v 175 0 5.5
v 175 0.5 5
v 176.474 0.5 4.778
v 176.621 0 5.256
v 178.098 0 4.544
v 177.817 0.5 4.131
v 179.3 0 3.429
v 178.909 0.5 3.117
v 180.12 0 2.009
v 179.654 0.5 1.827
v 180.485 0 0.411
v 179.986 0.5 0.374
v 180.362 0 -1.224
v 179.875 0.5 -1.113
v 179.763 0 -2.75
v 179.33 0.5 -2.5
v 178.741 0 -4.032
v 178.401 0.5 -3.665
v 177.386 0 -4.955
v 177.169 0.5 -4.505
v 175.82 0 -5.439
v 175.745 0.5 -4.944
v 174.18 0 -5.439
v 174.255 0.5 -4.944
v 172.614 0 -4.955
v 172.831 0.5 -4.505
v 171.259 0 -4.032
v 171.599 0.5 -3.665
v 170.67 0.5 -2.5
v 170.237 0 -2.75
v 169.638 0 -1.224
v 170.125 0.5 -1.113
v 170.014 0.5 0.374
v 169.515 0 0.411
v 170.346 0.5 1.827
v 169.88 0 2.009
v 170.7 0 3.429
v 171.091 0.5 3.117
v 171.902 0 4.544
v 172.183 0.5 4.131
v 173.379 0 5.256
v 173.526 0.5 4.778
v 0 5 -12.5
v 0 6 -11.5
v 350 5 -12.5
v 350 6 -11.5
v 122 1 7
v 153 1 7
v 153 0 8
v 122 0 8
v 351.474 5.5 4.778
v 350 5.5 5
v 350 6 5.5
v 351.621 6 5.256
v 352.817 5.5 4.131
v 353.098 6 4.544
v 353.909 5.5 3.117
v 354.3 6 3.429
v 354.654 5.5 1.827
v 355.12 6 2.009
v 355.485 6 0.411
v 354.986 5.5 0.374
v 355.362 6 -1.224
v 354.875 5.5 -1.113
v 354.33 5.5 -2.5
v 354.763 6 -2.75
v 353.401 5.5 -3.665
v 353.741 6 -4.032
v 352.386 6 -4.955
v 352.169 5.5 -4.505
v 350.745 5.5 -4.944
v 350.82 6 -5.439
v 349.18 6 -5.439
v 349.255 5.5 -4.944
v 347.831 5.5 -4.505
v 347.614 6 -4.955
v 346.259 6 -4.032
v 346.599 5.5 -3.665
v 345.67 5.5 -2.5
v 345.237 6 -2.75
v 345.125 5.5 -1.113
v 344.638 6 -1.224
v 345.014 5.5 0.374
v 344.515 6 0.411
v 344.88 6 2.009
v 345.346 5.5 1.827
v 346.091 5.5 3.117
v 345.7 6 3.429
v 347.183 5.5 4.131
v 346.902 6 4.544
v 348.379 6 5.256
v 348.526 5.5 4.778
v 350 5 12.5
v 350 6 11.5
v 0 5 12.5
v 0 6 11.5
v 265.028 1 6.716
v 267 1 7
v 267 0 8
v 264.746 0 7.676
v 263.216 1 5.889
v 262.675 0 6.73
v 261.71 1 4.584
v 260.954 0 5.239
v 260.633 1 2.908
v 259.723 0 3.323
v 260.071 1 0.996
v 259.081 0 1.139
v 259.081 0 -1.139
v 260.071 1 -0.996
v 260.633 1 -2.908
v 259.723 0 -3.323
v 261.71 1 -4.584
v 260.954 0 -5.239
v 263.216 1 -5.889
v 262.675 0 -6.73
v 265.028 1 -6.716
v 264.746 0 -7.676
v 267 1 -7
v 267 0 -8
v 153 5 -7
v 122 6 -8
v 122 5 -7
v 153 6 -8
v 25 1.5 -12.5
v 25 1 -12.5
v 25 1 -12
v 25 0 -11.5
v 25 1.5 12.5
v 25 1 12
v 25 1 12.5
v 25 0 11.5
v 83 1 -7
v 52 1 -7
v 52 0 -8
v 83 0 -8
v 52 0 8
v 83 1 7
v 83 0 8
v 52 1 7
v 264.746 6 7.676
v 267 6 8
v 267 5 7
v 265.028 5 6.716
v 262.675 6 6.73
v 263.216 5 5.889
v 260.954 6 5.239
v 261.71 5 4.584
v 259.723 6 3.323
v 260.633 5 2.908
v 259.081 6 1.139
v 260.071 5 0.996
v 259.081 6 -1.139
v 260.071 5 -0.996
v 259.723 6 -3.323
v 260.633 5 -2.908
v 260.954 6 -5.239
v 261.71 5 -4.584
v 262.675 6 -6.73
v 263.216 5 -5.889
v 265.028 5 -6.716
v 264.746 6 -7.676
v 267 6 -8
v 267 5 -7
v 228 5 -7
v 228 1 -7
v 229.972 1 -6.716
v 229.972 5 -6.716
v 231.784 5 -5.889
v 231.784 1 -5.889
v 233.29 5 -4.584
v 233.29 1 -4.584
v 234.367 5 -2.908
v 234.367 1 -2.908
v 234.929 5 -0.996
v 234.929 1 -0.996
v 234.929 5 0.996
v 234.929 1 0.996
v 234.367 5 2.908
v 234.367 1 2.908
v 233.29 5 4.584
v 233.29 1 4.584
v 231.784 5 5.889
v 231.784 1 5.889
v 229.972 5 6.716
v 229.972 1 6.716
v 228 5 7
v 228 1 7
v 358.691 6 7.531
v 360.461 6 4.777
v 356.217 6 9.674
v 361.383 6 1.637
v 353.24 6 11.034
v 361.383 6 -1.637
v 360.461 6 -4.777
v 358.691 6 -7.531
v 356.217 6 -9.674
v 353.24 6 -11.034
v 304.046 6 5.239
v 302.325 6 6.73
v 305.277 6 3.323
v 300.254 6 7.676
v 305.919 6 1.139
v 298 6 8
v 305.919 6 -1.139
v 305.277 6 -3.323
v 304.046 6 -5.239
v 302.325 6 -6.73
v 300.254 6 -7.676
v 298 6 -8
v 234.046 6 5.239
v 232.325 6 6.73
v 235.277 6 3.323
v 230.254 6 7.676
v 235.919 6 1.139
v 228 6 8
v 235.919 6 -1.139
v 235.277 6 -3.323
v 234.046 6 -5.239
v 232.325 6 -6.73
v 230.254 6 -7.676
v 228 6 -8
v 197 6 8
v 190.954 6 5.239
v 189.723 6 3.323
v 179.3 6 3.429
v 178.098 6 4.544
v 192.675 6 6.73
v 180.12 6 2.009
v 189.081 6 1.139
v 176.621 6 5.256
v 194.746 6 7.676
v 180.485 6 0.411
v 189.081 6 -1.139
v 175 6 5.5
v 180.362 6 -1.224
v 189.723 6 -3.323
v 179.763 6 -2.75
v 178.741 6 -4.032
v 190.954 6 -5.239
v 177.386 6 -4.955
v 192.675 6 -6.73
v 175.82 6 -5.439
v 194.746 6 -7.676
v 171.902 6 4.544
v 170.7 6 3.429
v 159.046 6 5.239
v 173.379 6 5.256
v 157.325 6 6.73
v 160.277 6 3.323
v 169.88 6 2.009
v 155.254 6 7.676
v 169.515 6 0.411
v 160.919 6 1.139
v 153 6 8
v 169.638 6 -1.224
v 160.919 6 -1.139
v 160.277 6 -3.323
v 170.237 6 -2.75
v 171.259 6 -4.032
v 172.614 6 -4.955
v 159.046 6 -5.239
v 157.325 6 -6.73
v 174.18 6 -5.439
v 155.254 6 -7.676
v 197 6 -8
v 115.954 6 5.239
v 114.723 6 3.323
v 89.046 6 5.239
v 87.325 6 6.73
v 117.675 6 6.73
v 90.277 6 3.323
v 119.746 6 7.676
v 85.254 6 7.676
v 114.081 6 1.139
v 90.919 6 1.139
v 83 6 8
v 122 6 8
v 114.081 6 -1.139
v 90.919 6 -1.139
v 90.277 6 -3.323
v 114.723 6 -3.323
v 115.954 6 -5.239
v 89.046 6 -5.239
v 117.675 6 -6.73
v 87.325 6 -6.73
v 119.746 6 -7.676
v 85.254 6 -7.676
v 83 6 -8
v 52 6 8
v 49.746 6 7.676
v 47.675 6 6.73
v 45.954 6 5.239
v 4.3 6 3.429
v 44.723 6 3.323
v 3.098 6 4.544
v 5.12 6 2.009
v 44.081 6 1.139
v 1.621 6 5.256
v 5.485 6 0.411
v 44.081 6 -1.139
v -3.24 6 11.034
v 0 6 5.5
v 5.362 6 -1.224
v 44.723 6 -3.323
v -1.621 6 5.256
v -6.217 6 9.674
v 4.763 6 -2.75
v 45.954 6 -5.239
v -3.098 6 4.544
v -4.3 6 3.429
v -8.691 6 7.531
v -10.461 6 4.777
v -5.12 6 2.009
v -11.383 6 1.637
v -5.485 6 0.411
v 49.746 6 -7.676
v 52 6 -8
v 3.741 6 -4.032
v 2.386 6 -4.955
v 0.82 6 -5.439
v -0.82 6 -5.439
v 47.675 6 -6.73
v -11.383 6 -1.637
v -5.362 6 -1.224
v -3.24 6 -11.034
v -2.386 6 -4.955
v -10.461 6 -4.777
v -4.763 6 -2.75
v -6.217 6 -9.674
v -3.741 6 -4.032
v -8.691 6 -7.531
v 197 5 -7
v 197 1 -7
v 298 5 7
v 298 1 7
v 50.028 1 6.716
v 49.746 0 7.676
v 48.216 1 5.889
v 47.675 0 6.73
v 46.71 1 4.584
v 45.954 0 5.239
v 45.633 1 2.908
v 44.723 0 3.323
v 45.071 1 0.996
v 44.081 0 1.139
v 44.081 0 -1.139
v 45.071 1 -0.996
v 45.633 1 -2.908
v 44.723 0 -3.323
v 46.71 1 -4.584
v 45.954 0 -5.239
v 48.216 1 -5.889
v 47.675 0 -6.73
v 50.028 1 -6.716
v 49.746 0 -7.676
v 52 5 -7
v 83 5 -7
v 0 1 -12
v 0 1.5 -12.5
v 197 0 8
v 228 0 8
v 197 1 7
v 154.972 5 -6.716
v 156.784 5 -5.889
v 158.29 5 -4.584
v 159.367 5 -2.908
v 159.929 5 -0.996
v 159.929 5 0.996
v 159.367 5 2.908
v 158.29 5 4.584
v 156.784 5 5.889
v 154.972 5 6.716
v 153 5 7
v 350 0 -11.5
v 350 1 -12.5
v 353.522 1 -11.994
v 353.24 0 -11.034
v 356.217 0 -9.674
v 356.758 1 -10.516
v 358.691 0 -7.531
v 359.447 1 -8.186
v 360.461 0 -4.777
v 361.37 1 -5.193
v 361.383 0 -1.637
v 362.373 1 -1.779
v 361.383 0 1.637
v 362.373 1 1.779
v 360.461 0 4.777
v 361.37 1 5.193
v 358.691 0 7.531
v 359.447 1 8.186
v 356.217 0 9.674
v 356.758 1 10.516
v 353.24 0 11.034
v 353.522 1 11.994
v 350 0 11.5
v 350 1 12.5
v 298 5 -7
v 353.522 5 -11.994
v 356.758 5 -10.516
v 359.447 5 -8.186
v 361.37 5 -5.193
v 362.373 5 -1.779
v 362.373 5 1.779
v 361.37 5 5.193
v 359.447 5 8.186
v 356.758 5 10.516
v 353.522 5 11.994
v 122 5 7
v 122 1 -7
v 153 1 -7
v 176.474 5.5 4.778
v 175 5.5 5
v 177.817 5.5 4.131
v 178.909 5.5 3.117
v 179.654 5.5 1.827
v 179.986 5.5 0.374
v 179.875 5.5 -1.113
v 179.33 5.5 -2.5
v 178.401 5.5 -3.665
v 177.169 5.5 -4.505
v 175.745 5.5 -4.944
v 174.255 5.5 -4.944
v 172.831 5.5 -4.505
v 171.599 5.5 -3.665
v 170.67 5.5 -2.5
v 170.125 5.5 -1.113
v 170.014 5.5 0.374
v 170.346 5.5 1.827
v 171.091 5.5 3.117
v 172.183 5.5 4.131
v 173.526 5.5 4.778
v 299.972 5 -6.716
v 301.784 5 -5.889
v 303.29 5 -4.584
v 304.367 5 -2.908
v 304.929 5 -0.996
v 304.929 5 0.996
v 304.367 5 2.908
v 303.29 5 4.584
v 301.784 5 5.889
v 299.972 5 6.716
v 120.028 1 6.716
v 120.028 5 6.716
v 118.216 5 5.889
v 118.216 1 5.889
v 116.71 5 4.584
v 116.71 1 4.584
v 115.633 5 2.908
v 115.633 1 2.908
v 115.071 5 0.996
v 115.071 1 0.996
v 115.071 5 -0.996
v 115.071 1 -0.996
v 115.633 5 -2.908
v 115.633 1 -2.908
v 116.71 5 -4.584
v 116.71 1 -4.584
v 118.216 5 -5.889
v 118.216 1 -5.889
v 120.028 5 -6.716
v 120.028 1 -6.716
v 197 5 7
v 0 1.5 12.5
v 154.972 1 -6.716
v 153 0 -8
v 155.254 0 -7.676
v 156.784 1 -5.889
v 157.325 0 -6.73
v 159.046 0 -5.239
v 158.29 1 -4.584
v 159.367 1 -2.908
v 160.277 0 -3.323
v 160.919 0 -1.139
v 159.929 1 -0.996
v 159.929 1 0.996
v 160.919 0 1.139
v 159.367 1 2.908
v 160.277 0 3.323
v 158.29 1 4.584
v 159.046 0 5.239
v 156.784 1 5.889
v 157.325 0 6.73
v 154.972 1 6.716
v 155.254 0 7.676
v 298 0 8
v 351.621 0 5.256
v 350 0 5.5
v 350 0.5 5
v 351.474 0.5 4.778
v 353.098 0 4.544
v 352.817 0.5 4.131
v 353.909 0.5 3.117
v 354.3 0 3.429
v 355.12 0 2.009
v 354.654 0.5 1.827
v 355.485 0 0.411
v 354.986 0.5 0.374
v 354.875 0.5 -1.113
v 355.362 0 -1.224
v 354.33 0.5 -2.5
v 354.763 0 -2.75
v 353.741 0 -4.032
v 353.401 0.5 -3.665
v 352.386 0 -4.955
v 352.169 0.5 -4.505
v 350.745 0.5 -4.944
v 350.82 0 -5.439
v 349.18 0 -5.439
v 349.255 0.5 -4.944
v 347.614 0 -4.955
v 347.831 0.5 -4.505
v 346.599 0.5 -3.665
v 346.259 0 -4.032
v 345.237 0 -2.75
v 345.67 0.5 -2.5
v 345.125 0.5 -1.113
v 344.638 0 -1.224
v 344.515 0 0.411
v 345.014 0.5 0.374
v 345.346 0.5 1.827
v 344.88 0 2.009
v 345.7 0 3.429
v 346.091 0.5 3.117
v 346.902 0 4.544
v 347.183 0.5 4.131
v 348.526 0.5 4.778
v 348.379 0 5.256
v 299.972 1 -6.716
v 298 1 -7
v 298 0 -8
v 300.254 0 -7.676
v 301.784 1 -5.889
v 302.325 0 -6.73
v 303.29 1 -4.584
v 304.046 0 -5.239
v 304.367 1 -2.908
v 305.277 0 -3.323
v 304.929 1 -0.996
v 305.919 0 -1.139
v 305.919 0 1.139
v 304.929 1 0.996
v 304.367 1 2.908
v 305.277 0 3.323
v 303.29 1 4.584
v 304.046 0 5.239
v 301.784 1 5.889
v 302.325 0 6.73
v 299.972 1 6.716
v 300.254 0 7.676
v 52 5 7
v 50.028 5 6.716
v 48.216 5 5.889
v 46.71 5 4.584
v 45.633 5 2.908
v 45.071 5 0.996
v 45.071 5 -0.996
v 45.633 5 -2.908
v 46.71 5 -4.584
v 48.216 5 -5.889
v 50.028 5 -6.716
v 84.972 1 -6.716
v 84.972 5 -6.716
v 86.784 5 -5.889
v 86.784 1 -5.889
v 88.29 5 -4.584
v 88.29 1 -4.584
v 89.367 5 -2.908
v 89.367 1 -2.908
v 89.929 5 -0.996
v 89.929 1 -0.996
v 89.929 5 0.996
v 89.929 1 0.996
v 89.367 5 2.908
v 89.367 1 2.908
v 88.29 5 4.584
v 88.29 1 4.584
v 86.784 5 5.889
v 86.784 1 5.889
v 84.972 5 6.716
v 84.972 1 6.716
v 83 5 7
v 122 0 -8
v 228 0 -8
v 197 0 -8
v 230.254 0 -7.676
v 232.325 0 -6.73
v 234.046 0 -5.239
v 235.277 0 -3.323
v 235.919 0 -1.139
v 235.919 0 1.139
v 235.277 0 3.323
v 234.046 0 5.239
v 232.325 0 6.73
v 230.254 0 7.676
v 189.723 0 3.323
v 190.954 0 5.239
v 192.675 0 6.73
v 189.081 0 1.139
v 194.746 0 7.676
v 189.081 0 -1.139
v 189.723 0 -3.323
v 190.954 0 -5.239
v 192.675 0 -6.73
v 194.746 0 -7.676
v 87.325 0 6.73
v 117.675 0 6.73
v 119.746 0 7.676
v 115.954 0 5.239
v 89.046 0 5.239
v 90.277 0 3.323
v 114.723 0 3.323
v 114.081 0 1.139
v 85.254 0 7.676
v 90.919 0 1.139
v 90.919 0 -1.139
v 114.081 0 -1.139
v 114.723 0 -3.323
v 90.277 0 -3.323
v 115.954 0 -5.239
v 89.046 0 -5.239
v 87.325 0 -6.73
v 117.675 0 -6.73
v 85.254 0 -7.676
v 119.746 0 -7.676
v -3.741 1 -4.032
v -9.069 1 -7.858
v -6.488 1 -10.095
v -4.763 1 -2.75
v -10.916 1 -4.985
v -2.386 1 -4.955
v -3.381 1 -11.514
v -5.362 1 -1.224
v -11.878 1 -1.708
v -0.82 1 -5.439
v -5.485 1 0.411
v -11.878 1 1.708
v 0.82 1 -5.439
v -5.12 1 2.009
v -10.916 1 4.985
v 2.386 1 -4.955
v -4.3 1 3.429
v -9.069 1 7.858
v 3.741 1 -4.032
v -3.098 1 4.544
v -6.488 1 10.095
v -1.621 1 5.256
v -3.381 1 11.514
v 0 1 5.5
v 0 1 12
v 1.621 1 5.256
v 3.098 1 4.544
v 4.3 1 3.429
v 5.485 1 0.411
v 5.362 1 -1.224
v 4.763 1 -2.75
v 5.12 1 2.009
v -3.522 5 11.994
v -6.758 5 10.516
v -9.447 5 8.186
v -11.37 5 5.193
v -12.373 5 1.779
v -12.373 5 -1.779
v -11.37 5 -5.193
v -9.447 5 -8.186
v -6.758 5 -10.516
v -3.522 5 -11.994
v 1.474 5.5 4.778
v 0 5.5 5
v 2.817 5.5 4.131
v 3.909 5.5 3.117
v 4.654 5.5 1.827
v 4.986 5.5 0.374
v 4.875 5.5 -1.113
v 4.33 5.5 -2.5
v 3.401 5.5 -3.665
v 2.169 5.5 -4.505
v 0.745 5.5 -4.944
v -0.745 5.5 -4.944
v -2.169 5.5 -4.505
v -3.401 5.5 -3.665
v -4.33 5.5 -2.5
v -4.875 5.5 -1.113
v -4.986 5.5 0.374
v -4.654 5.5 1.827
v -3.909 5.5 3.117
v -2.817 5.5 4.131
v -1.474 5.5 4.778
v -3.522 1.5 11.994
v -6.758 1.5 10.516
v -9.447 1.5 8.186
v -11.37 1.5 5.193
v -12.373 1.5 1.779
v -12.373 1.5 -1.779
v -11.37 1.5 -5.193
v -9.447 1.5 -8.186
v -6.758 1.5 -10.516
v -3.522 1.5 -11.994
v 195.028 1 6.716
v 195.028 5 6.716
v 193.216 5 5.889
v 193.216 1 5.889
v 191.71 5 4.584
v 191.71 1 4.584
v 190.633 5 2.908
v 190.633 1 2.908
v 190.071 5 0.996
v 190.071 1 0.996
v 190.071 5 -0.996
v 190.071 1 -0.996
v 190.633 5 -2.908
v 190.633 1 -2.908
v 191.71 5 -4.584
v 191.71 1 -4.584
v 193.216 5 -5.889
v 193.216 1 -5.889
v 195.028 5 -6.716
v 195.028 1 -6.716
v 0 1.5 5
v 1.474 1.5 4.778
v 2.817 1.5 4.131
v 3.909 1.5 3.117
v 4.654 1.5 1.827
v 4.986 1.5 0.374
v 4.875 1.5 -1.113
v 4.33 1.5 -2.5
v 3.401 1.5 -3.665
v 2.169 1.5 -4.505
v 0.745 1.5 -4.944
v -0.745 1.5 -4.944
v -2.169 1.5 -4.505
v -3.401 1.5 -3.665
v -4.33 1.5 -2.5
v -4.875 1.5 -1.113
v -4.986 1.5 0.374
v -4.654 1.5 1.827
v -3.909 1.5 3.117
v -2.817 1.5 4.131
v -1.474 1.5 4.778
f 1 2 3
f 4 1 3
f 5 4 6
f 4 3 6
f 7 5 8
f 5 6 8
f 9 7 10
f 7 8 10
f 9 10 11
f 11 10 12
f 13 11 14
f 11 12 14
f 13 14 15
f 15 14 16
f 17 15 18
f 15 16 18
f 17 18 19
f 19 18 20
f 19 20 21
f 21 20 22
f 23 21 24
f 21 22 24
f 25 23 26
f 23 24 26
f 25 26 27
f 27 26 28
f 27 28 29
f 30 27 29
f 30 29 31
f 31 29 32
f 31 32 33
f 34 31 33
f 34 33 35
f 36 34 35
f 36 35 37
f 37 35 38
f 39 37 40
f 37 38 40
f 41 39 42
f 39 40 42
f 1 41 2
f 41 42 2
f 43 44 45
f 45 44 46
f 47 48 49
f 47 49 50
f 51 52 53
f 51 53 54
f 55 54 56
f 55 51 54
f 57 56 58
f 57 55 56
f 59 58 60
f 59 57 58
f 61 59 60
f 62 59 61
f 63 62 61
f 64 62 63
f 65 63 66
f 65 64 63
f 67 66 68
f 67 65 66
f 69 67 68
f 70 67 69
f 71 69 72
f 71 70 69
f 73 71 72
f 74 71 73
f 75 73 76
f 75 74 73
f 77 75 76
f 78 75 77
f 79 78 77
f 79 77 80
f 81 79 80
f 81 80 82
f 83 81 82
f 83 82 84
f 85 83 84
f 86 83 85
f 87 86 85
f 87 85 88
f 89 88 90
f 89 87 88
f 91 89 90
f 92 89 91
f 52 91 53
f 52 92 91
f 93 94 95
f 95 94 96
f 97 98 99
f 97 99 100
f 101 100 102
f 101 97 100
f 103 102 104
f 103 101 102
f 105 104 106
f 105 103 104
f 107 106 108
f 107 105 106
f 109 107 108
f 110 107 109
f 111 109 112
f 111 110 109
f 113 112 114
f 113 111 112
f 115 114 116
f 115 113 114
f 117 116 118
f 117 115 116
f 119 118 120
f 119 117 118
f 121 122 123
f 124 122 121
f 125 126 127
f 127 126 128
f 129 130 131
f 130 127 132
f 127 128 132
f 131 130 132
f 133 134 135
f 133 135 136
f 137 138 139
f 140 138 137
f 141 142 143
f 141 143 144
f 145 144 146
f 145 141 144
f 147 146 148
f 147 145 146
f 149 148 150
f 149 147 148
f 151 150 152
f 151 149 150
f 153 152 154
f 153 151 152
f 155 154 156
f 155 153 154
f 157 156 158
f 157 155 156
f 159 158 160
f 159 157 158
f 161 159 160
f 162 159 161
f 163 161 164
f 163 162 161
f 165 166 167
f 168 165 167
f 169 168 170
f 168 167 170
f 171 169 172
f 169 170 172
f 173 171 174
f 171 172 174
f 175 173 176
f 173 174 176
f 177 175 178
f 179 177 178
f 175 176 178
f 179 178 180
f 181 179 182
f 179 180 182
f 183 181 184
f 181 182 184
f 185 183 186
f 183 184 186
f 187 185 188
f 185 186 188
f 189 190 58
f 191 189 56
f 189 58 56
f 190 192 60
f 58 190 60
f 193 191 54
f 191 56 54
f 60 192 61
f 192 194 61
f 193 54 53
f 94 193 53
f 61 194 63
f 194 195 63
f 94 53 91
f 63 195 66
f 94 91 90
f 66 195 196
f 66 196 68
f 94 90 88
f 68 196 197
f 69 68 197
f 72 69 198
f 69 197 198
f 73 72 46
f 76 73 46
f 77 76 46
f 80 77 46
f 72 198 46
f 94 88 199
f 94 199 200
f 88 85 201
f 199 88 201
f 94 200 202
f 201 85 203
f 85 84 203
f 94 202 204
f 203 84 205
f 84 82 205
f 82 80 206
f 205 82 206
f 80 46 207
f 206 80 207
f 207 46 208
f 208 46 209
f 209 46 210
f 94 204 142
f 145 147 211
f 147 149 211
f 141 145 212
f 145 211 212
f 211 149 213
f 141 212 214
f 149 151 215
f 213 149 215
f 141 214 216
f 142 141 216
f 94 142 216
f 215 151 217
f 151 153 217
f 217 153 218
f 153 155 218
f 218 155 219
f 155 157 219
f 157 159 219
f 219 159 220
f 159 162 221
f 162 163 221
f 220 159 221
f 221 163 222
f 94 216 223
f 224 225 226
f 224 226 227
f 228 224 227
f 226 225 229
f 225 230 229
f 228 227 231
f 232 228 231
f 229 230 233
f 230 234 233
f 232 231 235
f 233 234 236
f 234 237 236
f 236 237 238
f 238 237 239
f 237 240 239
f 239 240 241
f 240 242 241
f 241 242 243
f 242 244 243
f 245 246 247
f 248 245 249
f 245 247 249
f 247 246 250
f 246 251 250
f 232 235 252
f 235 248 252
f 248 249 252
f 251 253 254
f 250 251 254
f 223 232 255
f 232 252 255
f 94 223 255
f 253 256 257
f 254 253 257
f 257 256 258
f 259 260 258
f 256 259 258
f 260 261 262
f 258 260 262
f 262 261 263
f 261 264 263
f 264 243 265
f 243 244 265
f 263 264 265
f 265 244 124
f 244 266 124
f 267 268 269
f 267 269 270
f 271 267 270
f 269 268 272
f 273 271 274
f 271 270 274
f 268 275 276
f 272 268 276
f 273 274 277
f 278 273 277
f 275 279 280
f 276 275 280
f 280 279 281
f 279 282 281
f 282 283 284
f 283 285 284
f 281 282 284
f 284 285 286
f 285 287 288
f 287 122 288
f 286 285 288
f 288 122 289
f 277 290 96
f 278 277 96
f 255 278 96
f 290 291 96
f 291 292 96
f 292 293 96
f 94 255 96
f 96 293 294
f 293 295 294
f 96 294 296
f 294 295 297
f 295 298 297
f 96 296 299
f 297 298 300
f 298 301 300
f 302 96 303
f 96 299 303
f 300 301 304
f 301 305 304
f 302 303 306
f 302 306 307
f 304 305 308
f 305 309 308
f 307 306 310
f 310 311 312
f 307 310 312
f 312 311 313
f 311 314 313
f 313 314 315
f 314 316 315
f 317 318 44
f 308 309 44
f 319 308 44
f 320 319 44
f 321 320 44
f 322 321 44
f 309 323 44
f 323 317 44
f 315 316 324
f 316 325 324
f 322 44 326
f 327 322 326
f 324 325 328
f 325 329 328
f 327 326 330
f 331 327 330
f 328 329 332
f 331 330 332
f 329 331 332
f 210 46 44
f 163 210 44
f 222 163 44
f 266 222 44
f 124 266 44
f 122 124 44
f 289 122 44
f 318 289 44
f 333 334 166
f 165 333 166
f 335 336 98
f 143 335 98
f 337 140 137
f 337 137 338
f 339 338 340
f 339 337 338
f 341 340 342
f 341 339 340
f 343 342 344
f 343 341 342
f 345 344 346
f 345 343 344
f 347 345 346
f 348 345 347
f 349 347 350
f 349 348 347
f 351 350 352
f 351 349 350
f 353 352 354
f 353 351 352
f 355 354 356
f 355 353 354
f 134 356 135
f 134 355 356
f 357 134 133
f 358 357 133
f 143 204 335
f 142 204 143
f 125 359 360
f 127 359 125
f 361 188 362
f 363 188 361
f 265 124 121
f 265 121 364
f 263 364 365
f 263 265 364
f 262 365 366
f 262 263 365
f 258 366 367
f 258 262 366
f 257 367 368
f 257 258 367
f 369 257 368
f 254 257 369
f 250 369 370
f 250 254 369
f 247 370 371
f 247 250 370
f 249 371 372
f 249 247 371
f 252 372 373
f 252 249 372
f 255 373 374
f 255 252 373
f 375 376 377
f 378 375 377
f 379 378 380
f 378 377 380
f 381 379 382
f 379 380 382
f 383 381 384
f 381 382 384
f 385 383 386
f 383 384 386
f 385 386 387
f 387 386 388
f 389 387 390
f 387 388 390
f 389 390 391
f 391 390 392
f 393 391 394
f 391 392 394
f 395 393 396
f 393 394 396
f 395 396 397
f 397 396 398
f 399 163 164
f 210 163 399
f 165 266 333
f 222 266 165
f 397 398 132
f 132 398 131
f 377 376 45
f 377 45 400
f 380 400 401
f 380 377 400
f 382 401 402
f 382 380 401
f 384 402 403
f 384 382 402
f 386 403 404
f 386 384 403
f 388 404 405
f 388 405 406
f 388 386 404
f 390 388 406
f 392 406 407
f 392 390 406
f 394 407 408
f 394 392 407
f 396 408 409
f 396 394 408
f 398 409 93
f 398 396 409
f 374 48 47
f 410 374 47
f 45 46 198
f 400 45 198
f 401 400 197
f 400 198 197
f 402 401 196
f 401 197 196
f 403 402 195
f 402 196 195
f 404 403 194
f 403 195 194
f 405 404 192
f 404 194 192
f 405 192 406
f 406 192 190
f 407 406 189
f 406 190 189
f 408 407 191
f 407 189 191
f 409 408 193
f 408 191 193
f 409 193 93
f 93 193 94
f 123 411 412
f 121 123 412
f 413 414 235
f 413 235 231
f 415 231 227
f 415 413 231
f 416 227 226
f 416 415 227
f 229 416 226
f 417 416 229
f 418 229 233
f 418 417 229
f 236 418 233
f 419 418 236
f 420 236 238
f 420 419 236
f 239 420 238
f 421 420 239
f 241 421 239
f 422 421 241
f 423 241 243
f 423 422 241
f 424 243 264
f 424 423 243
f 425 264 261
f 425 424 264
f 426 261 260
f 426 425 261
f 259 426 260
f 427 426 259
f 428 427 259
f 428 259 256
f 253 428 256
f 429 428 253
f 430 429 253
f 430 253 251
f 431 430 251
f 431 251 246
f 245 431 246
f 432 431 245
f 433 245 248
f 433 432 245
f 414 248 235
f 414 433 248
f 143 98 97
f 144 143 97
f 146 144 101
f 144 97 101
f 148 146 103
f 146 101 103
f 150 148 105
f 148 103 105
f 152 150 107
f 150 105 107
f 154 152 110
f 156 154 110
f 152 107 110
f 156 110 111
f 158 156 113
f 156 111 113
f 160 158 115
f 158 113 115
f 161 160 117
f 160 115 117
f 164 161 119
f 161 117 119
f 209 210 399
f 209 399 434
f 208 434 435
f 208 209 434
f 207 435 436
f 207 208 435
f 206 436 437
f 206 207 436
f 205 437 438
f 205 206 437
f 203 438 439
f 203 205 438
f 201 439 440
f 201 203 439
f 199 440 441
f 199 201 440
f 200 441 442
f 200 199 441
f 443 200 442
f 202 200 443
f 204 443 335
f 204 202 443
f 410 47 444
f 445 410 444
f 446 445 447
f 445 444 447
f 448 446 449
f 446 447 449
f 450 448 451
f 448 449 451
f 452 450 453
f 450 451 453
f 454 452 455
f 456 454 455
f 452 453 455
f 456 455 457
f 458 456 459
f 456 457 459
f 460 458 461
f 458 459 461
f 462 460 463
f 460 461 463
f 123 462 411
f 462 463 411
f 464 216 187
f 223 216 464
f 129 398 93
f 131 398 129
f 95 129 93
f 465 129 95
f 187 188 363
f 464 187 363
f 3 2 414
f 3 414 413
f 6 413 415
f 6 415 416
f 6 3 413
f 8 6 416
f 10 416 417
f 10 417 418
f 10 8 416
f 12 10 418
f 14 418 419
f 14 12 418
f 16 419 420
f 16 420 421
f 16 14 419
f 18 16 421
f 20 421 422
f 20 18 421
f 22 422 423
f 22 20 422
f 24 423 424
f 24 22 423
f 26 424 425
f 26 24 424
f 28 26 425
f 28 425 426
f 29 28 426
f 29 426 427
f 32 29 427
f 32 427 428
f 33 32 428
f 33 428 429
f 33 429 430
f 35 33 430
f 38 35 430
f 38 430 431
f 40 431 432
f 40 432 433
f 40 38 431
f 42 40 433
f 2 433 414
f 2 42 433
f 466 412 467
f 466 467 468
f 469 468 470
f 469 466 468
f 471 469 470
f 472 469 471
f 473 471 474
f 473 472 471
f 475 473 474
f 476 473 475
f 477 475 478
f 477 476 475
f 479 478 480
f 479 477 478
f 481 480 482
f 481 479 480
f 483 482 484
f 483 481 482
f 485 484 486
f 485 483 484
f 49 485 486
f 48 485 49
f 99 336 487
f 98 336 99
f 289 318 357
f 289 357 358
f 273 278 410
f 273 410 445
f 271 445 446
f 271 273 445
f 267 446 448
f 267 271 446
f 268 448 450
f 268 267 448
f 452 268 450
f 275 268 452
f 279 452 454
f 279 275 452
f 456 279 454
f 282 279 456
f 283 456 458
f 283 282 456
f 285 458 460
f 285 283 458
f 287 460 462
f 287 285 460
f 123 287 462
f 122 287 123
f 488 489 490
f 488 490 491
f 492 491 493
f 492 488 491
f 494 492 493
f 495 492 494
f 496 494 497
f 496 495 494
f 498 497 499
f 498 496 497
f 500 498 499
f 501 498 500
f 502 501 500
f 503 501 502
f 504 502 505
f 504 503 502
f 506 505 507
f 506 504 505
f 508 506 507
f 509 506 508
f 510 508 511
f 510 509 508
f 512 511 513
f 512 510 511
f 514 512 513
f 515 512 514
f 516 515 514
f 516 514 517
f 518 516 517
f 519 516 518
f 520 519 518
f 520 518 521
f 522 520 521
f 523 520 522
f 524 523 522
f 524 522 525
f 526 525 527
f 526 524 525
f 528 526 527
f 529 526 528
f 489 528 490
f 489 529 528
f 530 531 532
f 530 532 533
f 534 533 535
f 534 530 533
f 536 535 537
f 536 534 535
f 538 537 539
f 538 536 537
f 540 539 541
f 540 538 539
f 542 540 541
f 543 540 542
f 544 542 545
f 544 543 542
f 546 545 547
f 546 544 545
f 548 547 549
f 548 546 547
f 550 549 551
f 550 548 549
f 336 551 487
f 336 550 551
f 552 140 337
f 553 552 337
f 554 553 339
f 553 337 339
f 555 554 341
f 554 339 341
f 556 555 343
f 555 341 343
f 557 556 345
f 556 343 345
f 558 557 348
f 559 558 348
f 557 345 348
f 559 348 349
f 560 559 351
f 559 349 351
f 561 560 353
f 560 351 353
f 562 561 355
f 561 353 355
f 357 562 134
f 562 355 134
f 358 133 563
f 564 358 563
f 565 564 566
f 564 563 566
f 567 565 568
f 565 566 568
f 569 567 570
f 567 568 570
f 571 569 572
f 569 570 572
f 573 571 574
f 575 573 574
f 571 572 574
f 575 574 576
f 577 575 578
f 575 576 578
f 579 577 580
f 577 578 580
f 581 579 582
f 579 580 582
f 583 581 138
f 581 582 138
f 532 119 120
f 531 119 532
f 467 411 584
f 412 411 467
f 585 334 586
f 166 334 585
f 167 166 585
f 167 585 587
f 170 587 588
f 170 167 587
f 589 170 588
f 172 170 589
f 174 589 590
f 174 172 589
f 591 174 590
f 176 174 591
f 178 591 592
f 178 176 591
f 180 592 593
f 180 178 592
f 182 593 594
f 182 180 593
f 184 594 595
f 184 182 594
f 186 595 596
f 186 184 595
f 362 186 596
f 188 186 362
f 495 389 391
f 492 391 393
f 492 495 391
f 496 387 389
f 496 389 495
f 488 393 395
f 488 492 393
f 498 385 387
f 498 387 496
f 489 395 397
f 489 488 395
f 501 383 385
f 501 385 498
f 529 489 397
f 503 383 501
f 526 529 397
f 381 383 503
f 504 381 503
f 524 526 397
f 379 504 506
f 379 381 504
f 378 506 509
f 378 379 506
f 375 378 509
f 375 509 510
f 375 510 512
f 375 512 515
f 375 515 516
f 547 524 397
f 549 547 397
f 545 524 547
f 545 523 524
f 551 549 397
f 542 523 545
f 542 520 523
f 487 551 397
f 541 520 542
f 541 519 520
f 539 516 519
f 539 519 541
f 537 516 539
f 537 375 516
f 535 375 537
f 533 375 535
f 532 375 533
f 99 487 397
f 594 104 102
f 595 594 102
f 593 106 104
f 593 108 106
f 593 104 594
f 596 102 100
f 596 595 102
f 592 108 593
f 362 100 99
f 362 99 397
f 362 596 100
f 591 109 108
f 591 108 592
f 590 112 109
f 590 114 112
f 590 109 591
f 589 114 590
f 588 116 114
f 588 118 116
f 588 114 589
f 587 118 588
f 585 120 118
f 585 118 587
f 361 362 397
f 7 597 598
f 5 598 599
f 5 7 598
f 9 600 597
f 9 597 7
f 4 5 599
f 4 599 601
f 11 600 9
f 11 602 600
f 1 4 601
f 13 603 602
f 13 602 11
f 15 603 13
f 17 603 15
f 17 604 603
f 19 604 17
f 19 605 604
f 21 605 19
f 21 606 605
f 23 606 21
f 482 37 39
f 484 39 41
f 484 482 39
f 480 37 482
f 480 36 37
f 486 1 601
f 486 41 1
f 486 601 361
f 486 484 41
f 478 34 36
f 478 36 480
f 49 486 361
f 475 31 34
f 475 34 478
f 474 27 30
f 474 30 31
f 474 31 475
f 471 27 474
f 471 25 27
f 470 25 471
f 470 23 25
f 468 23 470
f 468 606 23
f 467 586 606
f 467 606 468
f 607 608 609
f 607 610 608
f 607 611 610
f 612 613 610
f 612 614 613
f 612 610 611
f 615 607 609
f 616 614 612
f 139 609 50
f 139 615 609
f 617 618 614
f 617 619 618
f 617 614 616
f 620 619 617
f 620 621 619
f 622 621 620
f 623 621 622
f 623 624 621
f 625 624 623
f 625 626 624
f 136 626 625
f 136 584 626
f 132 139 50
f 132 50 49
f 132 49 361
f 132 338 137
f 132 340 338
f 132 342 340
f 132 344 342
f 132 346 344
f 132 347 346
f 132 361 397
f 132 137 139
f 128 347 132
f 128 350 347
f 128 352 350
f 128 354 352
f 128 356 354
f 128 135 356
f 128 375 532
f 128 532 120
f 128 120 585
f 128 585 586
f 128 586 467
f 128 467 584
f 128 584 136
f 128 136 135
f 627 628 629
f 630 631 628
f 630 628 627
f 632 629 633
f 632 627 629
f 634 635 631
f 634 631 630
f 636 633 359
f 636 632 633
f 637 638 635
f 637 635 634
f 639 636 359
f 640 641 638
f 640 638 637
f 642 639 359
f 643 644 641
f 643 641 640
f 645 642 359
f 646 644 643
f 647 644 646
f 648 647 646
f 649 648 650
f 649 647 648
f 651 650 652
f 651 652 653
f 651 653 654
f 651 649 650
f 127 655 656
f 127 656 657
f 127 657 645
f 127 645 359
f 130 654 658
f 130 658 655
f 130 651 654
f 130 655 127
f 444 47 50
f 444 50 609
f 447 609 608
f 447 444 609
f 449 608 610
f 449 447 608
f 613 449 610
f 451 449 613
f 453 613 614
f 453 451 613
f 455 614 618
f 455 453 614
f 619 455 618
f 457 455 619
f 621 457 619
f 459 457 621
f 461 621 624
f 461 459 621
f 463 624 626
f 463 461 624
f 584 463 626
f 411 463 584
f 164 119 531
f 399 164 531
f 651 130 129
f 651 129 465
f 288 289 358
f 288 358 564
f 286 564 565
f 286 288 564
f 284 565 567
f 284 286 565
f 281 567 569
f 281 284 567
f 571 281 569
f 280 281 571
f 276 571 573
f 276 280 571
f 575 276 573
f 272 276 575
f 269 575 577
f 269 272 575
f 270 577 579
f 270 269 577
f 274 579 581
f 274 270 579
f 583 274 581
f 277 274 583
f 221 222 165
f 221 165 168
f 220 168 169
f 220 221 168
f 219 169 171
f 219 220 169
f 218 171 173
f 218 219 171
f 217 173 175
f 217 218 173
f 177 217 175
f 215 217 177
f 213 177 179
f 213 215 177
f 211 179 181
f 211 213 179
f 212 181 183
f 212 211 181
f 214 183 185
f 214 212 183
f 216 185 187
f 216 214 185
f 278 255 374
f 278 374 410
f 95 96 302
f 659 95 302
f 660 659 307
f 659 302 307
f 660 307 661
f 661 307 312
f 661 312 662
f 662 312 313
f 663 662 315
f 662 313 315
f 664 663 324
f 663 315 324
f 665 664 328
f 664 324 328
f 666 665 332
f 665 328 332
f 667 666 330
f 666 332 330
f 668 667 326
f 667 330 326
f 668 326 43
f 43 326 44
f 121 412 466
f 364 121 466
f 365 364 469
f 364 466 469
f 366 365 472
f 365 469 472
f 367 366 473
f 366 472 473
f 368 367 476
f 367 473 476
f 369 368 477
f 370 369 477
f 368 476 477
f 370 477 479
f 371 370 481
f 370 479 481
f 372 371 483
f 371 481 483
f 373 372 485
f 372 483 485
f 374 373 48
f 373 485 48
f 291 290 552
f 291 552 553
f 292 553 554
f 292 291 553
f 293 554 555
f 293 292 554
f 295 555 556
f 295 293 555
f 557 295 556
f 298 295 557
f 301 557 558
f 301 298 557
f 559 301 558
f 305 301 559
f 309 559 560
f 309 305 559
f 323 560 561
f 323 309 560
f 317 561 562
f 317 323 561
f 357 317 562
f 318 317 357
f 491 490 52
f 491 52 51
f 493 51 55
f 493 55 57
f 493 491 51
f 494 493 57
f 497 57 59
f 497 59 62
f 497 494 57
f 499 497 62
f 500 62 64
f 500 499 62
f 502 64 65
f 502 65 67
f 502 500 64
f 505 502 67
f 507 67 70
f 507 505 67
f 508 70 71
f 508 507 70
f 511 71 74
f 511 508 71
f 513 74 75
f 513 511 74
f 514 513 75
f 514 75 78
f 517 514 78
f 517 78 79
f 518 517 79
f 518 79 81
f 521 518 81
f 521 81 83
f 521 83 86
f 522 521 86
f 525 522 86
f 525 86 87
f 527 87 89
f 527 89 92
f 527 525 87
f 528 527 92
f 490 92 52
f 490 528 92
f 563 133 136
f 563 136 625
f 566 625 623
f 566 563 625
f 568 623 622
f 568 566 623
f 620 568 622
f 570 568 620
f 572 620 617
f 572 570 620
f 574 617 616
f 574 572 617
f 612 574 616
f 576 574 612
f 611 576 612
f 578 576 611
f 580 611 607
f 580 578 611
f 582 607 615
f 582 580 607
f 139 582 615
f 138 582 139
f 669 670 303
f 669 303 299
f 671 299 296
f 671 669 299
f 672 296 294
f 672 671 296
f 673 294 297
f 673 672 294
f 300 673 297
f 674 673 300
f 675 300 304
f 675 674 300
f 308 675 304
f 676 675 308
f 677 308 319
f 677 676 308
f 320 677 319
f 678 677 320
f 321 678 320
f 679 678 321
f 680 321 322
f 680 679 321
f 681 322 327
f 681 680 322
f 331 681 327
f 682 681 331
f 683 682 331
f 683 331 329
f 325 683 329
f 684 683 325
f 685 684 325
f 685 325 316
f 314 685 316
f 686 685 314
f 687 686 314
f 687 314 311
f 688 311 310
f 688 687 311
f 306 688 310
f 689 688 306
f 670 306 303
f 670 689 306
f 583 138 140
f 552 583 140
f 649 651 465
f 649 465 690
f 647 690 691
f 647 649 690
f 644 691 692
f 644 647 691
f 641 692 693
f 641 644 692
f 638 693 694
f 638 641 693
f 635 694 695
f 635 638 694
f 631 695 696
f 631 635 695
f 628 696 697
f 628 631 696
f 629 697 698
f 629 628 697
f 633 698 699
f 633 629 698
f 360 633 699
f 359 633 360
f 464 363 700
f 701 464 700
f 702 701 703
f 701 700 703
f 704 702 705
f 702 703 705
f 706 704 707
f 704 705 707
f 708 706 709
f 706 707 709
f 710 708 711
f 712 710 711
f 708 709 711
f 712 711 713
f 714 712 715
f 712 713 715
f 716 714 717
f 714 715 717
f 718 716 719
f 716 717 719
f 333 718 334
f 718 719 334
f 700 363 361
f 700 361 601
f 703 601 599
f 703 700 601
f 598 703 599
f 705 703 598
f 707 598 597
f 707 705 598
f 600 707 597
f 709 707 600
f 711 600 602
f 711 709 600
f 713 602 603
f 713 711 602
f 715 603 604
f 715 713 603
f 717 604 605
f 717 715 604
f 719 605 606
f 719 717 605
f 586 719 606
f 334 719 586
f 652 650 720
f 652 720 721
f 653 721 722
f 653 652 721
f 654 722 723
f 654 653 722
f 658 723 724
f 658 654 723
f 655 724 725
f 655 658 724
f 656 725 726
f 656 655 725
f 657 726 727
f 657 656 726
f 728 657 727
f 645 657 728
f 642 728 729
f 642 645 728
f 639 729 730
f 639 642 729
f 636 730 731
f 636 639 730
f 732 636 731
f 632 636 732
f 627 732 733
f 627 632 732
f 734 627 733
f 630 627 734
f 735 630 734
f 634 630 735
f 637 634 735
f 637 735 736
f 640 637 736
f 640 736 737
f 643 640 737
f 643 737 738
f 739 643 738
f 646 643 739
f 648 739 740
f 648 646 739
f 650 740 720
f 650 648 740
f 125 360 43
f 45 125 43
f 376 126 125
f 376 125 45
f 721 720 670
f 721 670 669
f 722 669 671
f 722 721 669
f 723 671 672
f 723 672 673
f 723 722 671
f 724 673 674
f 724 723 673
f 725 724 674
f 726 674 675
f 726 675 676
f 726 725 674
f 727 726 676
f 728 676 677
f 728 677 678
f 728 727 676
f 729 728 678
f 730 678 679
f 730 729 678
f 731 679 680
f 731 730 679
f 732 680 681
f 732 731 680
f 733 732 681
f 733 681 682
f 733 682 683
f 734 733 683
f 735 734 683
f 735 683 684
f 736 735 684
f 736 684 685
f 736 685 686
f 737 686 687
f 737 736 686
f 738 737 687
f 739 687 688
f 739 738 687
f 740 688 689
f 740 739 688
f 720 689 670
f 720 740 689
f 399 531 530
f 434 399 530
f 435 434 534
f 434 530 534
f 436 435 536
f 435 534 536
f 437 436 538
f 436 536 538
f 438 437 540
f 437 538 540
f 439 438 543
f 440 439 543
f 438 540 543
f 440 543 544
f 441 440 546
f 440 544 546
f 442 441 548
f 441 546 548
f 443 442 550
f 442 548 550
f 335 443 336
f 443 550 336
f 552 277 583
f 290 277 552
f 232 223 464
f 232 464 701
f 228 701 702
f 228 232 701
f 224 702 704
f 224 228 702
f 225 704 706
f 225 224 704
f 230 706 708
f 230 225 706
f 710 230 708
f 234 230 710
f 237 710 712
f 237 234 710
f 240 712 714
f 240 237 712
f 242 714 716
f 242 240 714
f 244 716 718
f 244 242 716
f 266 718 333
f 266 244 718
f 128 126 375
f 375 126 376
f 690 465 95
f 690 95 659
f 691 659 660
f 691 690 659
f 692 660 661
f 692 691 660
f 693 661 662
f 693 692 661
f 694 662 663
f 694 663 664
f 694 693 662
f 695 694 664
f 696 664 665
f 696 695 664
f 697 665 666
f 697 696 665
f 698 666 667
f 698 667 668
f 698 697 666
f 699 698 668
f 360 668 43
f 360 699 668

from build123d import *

# Parameters (mm, degrees)
ESQUISSE1_R             = 5
BOSS_EXTRU_1_DEPTH      = 6
ESQUISSE2_R             = 5
ENL_V_MAT_EXTRU_1_DEPTH = 1
CHANFREIN7_SIZE         = 0.5
CHANFREIN8_SIZE         = 1
CHANFREIN9_SIZE         = 1
CHANFREIN10_SIZE        = 1
CHANFREIN11_SIZE        = 0.5
CHANFREIN12_SIZE        = 0.5


with BuildPart() as part:
    # Esquisse1 → Boss.-Extru.1 (new body)
    with BuildSketch(Plane(origin=(0, 0, 0), x_dir=(1, 0, 0), z_dir=(0, 1, 0))):
        with BuildLine():
            Line((0, 12.5), (350, 12.5))
            ThreePointArc((350, 12.5), (362.5, 0), (350, -12.5))
            Line((350, -12.5), (0, -12.5))
            ThreePointArc((0, -12.5), (-12.5, 0), (0, 12.5))
        make_face()
        with Locations(Location((0, 0, 0), (0, 0, 270))):  # turned: the seam where the file's is
            Circle(ESQUISSE1_R, mode=Mode.SUBTRACT)
        with Locations(Location((350, 0, 0), (0, 0, 270))):  # turned: the seam where the file's is
            Circle(ESQUISSE1_R, mode=Mode.SUBTRACT)
        with Locations(Location((175, 0, 0), (0, 0, 270))):  # turned: the seam where the file's is
            Circle(ESQUISSE1_R, mode=Mode.SUBTRACT)
        with BuildLine():
            Line((52, 7), (83, 7))
            ThreePointArc((83, 7), (90, 0), (83, -7))
            Line((83, -7), (52, -7))
            ThreePointArc((52, -7), (45, 0), (52, 7))
        make_face(mode=Mode.SUBTRACT)
        with BuildLine():
            Line((122, 7), (153, 7))
            ThreePointArc((153, 7), (160, 0), (153, -7))
            Line((153, -7), (122, -7))
            ThreePointArc((122, -7), (115, 0), (122, 7))
        make_face(mode=Mode.SUBTRACT)
        with BuildLine():
            Line((197, 7), (228, 7))
            ThreePointArc((228, 7), (235, 0), (228, -7))
            Line((228, -7), (197, -7))
            ThreePointArc((197, -7), (190, 0), (197, 7))
        make_face(mode=Mode.SUBTRACT)
        with BuildLine():
            Line((267, 7), (298, 7))
            ThreePointArc((298, 7), (305, 0), (298, -7))
            Line((298, -7), (267, -7))
            ThreePointArc((267, -7), (260, 0), (267, 7))
        make_face(mode=Mode.SUBTRACT)
    extrude(amount=BOSS_EXTRU_1_DEPTH)

    # Esquisse2 → Enlèv. mat.-Extru.1 (cut)
    with BuildSketch(Plane.XZ):
        with BuildLine():
            Line((0, -12.5), (25, -12.5))
            Line((25, -12.5), (25, 12.5))
            Line((25, 12.5), (0, 12.5))
            ThreePointArc((0, 12.5), (-12.5, 0), (0, -12.5))
        make_face()
        with Locations(Location((0, 0, 0), (0, 0, 270))):  # turned: the seam where the file's is
            Circle(ESQUISSE2_R, mode=Mode.SUBTRACT)
    extrude(amount=-ENL_V_MAT_EXTRU_1_DEPTH, mode=Mode.SUBTRACT)

    # Chanfrein7
    chanfrein7_edges = [part.edges().sort_by_distance(p)[0] for p in [
        (-12.5, 1, 0),
        (12.5, 1, 12.5),
        (12.5, 1, -12.5),
    ]]
    chamfer(chanfrein7_edges, length=CHANFREIN7_SIZE)

    # Chanfrein8
    chanfrein8_edges = [part.edges().sort_by_distance(p)[0] for p in [
        (190, 0, 0),
        (212.5, 0, 7),
        (235, 0, 0),
        (212.5, 0, -7),
        (190, 6, 0),
        (212.5, 6, 7),
        (235, 6, 0),
        (212.5, 6, -7),
        (45, 0, 0),
        (67.5, 0, 7),
        (90, 0, 0),
        (67.5, 0, -7),
        (45, 6, 0),
        (67.5, 6, 7),
        (90, 6, 0),
        (67.5, 6, -7),
        (160, 0, 0),
        (137.5, 0, -7),
        (115, 0, 0),
        (137.5, 0, 7),
        (160, 6, 0),
        (137.5, 6, -7),
        (115, 6, 0),
        (137.5, 6, 7),
        (305, 0, 0),
        (282.5, 0, -7),
        (260, 0, 0),
        (282.5, 0, 7),
        (305, 6, 0),
        (282.5, 6, -7),
        (260, 6, 0),
        (282.5, 6, 7),
    ]]
    chamfer(chanfrein8_edges, length=CHANFREIN8_SIZE)

    # Chanfrein9
    chanfrein9_edges = [part.edges().sort_by_distance(p)[0] for p in [
        (187.5, 0, -12.5),
        (362.5, 0, 0),
        (187.5, 0, 12.5),
    ]]
    chamfer(chanfrein9_edges, length=CHANFREIN9_SIZE)

    # Chanfrein10
    chanfrein10_edges = [part.edges().sort_by_distance(p)[0] for p in [
        (362.5, 6, 0),
        (175, 6, -12.5),
        (-12.5, 6, 0),
        (175, 6, 12.5),
    ]]
    chamfer(chanfrein10_edges, length=CHANFREIN10_SIZE)

    # Chanfrein11
    chanfrein11_edges = [part.edges().sort_by_distance(p)[0] for p in [
        (175, 0, -5),
        (175, 6, -5),
    ]]
    chamfer(chanfrein11_edges, length=CHANFREIN11_SIZE)

    # Chanfrein12
    chanfrein12_edges = [part.edges().sort_by_distance(p)[0] for p in [
        (350, 0, -5),
        (350, 6, -5),
        (0, 6, -5),
        (0, 1, -5),
    ]]
    chamfer(chanfrein12_edges, length=CHANFREIN12_SIZE)


solid = part.part
